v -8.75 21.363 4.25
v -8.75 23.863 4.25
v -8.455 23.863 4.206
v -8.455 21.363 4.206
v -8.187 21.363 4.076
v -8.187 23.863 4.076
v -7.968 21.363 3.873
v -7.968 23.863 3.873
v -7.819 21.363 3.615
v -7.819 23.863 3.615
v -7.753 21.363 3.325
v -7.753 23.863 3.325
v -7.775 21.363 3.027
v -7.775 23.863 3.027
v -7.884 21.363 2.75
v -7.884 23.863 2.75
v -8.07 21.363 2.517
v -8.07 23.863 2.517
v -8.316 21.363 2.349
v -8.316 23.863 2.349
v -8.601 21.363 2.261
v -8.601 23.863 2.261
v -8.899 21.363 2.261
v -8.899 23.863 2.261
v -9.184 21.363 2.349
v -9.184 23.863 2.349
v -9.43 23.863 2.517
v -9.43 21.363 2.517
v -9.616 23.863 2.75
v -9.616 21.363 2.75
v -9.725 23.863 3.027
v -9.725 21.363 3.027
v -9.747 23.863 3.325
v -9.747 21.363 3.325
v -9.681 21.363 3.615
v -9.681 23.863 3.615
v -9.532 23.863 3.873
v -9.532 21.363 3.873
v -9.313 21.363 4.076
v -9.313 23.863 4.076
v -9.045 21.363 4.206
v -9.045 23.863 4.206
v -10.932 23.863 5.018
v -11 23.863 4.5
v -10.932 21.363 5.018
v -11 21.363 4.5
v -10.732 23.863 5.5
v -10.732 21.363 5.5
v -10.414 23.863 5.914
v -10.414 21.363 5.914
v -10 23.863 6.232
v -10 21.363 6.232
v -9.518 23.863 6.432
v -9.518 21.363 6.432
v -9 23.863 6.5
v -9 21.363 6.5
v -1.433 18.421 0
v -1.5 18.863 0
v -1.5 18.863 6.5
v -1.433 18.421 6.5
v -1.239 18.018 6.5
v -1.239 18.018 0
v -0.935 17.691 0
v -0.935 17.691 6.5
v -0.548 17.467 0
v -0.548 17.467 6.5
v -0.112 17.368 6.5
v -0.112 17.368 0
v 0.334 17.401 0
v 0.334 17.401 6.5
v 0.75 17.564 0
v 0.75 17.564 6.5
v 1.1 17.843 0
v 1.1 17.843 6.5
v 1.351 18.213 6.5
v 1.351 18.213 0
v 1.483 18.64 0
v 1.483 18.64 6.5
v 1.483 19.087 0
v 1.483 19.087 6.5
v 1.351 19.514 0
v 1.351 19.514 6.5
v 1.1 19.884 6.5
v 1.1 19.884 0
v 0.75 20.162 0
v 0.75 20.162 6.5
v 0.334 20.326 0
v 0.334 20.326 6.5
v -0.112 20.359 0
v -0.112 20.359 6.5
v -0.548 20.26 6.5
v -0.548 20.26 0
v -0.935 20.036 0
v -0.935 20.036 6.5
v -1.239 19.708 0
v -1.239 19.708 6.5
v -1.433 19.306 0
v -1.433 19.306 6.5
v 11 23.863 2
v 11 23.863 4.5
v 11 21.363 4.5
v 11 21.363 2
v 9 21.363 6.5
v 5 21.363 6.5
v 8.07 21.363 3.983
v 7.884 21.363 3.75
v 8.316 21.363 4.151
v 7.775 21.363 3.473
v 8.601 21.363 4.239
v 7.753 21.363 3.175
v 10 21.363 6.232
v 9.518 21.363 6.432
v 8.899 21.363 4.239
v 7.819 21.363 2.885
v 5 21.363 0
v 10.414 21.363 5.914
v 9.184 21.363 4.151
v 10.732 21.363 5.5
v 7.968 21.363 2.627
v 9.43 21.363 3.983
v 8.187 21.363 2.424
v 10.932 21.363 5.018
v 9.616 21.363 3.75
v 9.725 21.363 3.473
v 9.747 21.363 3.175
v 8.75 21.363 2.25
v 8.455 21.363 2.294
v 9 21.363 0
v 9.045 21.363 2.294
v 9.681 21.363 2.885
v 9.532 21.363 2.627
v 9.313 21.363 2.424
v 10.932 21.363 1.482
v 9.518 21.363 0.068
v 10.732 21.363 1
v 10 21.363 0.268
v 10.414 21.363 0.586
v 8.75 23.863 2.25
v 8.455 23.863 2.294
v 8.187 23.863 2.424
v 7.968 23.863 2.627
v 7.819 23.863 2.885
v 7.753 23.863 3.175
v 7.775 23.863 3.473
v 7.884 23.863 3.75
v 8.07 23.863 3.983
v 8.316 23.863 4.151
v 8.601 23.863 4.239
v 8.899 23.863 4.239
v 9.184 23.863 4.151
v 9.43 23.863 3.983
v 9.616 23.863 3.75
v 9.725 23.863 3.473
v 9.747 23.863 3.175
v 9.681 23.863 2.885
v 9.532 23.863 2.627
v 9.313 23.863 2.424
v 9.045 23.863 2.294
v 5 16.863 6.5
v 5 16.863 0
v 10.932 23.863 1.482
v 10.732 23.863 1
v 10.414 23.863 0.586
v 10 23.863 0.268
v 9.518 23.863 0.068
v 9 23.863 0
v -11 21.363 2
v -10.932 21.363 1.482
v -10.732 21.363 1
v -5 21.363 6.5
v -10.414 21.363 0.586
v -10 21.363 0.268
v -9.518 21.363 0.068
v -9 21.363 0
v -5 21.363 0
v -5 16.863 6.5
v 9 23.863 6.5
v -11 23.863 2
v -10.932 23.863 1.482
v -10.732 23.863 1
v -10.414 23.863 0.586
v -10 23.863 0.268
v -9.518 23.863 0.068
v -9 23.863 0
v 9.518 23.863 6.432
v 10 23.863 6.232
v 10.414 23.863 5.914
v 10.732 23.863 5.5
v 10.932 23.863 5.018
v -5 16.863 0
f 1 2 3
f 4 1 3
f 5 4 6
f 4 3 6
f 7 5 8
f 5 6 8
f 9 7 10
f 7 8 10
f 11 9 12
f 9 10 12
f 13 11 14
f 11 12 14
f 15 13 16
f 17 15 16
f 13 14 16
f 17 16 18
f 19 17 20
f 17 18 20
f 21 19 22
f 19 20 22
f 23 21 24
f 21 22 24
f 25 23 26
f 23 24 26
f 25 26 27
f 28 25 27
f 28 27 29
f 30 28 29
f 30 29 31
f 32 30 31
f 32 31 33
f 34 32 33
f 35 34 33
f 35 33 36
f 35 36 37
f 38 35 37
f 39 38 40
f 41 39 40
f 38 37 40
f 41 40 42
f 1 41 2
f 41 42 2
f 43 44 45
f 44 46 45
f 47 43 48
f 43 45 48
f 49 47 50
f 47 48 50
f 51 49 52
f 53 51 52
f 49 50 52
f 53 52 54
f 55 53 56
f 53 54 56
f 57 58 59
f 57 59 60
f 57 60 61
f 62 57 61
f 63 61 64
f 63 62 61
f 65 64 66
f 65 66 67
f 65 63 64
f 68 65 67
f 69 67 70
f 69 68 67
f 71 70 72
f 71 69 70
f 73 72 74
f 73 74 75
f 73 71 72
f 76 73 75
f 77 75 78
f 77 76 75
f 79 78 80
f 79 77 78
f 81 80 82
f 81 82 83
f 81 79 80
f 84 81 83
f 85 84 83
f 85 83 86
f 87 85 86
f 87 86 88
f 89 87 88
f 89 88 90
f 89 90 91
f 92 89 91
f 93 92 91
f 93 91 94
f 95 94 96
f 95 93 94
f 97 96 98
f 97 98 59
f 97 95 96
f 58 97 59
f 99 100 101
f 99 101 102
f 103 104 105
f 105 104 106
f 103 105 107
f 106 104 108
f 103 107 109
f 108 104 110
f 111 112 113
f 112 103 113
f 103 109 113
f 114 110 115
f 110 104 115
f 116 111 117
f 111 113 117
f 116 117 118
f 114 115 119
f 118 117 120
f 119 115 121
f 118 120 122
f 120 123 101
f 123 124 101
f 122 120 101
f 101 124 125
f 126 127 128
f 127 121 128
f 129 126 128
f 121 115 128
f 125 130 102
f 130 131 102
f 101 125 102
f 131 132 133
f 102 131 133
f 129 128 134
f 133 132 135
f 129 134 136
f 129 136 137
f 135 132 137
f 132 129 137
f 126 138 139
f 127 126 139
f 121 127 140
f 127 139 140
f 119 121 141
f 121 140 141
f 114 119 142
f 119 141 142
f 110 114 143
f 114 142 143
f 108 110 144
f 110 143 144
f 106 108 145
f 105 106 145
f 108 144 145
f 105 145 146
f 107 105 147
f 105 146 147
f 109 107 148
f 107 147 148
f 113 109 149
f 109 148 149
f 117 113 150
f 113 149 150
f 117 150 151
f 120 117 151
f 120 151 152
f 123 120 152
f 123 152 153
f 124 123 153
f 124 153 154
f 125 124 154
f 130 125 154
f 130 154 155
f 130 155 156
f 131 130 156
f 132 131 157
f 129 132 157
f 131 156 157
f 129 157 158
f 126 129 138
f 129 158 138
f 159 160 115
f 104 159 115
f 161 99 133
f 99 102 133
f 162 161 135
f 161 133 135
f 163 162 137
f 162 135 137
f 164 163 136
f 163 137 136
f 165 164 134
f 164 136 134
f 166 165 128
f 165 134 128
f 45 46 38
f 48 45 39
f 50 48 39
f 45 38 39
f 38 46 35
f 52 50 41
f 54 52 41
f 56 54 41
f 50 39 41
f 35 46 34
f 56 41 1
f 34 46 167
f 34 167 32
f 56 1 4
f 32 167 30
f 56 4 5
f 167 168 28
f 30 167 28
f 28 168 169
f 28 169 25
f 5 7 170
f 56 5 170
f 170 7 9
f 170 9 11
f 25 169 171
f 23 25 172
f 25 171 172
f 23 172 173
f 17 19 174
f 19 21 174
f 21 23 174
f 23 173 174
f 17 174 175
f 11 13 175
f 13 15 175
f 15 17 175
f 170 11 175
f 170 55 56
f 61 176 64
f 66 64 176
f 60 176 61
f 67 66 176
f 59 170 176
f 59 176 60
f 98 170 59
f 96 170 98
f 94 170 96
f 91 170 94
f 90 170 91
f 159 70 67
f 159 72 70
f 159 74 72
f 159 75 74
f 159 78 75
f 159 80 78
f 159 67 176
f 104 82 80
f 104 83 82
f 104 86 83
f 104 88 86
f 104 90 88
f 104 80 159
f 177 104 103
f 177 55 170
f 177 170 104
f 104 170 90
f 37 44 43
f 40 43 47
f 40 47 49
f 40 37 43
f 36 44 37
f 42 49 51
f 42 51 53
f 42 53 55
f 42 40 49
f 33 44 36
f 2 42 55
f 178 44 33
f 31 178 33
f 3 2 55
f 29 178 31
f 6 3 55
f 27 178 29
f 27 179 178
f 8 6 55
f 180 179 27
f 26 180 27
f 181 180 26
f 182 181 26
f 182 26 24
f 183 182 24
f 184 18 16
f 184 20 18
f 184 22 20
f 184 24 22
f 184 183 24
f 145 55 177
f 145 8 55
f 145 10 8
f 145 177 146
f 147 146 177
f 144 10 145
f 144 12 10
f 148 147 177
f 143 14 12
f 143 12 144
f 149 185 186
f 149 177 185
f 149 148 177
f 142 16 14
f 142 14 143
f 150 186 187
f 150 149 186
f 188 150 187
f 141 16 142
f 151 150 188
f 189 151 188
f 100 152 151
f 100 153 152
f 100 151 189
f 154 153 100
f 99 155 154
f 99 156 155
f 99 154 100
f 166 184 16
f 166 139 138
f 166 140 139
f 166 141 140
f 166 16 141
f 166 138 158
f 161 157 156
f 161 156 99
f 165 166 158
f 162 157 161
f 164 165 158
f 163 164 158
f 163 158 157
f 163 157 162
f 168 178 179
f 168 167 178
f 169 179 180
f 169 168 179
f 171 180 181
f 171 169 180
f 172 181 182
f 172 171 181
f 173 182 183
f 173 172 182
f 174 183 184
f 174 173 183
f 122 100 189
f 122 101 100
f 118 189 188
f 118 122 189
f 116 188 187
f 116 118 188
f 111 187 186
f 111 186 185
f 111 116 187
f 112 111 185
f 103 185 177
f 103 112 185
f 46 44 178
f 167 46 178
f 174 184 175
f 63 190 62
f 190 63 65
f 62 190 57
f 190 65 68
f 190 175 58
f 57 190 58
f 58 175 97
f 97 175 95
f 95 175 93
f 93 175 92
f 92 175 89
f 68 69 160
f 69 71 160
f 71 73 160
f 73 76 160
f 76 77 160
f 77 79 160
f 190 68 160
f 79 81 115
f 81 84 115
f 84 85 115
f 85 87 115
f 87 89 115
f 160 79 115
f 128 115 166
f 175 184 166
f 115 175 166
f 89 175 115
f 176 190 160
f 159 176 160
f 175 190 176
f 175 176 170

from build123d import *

# Parameters (mm, degrees)
SKETCH1_W           = 10
SKETCH1_H           = 4
SKETCH1_R           = 1.5
SKETCH1_H_2         = 3
BOSS_EXTRUDE1_DEPTH = 6.5
SKETCH12_W          = 22
SKETCH12_H          = 6.5
SKETCH12_R          = 1
BOSS_EXTRUDE2_DEPTH = 2.5
FILLET1_R           = 2


with BuildPart() as part:
    # Sketch1 → Boss-Extrude1 (new body)
    # profile 1 of 2: a face of its own
    with BuildSketch(Plane.XY):
        with Locations((0, 18.863386012)):
            Rectangle(SKETCH1_W, SKETCH1_H)
        with Locations(Location((0, 18.863386012, 0), (0, 0, 180))):
            Circle(SKETCH1_R, mode=Mode.SUBTRACT)
    # profile 2 of 2: a face of its own
    with BuildSketch(Plane.XY):
        with Locations((0, 22.363386012)):
            Rectangle(SKETCH1_W, SKETCH1_H_2)
    extrude(amount=BOSS_EXTRUDE1_DEPTH)

    # Sketch12 → Boss-Extrude2 (add)
    with BuildSketch(Plane(origin=(0, 23.863386012, 0), x_dir=(1, 0, 0), z_dir=(0, 1, 0))):
        with Locations((0, -3.25)):
            Rectangle(SKETCH12_W, SKETCH12_H)
        with Locations(Location((-8.75, -3.25, 0), (0, 0, 270))):
            Circle(SKETCH12_R, mode=Mode.SUBTRACT)
        with Locations(Location((8.75, -3.25, 0), (0, 0, 90))):
            Circle(SKETCH12_R, mode=Mode.SUBTRACT)
    extrude(amount=-BOSS_EXTRUDE2_DEPTH)

    # Fillet1
    fillet1_edges = [part.edges().sort_by_distance(p)[0] for p in [
        (-11, 22.613386012, 0),
        (11, 22.613386012, 0),
        (11, 22.613386012, 6.5),
        (-11, 22.613386012, 6.5),
    ]]
    fillet(fillet1_edges, radius=FILLET1_R)


solid = part.part
